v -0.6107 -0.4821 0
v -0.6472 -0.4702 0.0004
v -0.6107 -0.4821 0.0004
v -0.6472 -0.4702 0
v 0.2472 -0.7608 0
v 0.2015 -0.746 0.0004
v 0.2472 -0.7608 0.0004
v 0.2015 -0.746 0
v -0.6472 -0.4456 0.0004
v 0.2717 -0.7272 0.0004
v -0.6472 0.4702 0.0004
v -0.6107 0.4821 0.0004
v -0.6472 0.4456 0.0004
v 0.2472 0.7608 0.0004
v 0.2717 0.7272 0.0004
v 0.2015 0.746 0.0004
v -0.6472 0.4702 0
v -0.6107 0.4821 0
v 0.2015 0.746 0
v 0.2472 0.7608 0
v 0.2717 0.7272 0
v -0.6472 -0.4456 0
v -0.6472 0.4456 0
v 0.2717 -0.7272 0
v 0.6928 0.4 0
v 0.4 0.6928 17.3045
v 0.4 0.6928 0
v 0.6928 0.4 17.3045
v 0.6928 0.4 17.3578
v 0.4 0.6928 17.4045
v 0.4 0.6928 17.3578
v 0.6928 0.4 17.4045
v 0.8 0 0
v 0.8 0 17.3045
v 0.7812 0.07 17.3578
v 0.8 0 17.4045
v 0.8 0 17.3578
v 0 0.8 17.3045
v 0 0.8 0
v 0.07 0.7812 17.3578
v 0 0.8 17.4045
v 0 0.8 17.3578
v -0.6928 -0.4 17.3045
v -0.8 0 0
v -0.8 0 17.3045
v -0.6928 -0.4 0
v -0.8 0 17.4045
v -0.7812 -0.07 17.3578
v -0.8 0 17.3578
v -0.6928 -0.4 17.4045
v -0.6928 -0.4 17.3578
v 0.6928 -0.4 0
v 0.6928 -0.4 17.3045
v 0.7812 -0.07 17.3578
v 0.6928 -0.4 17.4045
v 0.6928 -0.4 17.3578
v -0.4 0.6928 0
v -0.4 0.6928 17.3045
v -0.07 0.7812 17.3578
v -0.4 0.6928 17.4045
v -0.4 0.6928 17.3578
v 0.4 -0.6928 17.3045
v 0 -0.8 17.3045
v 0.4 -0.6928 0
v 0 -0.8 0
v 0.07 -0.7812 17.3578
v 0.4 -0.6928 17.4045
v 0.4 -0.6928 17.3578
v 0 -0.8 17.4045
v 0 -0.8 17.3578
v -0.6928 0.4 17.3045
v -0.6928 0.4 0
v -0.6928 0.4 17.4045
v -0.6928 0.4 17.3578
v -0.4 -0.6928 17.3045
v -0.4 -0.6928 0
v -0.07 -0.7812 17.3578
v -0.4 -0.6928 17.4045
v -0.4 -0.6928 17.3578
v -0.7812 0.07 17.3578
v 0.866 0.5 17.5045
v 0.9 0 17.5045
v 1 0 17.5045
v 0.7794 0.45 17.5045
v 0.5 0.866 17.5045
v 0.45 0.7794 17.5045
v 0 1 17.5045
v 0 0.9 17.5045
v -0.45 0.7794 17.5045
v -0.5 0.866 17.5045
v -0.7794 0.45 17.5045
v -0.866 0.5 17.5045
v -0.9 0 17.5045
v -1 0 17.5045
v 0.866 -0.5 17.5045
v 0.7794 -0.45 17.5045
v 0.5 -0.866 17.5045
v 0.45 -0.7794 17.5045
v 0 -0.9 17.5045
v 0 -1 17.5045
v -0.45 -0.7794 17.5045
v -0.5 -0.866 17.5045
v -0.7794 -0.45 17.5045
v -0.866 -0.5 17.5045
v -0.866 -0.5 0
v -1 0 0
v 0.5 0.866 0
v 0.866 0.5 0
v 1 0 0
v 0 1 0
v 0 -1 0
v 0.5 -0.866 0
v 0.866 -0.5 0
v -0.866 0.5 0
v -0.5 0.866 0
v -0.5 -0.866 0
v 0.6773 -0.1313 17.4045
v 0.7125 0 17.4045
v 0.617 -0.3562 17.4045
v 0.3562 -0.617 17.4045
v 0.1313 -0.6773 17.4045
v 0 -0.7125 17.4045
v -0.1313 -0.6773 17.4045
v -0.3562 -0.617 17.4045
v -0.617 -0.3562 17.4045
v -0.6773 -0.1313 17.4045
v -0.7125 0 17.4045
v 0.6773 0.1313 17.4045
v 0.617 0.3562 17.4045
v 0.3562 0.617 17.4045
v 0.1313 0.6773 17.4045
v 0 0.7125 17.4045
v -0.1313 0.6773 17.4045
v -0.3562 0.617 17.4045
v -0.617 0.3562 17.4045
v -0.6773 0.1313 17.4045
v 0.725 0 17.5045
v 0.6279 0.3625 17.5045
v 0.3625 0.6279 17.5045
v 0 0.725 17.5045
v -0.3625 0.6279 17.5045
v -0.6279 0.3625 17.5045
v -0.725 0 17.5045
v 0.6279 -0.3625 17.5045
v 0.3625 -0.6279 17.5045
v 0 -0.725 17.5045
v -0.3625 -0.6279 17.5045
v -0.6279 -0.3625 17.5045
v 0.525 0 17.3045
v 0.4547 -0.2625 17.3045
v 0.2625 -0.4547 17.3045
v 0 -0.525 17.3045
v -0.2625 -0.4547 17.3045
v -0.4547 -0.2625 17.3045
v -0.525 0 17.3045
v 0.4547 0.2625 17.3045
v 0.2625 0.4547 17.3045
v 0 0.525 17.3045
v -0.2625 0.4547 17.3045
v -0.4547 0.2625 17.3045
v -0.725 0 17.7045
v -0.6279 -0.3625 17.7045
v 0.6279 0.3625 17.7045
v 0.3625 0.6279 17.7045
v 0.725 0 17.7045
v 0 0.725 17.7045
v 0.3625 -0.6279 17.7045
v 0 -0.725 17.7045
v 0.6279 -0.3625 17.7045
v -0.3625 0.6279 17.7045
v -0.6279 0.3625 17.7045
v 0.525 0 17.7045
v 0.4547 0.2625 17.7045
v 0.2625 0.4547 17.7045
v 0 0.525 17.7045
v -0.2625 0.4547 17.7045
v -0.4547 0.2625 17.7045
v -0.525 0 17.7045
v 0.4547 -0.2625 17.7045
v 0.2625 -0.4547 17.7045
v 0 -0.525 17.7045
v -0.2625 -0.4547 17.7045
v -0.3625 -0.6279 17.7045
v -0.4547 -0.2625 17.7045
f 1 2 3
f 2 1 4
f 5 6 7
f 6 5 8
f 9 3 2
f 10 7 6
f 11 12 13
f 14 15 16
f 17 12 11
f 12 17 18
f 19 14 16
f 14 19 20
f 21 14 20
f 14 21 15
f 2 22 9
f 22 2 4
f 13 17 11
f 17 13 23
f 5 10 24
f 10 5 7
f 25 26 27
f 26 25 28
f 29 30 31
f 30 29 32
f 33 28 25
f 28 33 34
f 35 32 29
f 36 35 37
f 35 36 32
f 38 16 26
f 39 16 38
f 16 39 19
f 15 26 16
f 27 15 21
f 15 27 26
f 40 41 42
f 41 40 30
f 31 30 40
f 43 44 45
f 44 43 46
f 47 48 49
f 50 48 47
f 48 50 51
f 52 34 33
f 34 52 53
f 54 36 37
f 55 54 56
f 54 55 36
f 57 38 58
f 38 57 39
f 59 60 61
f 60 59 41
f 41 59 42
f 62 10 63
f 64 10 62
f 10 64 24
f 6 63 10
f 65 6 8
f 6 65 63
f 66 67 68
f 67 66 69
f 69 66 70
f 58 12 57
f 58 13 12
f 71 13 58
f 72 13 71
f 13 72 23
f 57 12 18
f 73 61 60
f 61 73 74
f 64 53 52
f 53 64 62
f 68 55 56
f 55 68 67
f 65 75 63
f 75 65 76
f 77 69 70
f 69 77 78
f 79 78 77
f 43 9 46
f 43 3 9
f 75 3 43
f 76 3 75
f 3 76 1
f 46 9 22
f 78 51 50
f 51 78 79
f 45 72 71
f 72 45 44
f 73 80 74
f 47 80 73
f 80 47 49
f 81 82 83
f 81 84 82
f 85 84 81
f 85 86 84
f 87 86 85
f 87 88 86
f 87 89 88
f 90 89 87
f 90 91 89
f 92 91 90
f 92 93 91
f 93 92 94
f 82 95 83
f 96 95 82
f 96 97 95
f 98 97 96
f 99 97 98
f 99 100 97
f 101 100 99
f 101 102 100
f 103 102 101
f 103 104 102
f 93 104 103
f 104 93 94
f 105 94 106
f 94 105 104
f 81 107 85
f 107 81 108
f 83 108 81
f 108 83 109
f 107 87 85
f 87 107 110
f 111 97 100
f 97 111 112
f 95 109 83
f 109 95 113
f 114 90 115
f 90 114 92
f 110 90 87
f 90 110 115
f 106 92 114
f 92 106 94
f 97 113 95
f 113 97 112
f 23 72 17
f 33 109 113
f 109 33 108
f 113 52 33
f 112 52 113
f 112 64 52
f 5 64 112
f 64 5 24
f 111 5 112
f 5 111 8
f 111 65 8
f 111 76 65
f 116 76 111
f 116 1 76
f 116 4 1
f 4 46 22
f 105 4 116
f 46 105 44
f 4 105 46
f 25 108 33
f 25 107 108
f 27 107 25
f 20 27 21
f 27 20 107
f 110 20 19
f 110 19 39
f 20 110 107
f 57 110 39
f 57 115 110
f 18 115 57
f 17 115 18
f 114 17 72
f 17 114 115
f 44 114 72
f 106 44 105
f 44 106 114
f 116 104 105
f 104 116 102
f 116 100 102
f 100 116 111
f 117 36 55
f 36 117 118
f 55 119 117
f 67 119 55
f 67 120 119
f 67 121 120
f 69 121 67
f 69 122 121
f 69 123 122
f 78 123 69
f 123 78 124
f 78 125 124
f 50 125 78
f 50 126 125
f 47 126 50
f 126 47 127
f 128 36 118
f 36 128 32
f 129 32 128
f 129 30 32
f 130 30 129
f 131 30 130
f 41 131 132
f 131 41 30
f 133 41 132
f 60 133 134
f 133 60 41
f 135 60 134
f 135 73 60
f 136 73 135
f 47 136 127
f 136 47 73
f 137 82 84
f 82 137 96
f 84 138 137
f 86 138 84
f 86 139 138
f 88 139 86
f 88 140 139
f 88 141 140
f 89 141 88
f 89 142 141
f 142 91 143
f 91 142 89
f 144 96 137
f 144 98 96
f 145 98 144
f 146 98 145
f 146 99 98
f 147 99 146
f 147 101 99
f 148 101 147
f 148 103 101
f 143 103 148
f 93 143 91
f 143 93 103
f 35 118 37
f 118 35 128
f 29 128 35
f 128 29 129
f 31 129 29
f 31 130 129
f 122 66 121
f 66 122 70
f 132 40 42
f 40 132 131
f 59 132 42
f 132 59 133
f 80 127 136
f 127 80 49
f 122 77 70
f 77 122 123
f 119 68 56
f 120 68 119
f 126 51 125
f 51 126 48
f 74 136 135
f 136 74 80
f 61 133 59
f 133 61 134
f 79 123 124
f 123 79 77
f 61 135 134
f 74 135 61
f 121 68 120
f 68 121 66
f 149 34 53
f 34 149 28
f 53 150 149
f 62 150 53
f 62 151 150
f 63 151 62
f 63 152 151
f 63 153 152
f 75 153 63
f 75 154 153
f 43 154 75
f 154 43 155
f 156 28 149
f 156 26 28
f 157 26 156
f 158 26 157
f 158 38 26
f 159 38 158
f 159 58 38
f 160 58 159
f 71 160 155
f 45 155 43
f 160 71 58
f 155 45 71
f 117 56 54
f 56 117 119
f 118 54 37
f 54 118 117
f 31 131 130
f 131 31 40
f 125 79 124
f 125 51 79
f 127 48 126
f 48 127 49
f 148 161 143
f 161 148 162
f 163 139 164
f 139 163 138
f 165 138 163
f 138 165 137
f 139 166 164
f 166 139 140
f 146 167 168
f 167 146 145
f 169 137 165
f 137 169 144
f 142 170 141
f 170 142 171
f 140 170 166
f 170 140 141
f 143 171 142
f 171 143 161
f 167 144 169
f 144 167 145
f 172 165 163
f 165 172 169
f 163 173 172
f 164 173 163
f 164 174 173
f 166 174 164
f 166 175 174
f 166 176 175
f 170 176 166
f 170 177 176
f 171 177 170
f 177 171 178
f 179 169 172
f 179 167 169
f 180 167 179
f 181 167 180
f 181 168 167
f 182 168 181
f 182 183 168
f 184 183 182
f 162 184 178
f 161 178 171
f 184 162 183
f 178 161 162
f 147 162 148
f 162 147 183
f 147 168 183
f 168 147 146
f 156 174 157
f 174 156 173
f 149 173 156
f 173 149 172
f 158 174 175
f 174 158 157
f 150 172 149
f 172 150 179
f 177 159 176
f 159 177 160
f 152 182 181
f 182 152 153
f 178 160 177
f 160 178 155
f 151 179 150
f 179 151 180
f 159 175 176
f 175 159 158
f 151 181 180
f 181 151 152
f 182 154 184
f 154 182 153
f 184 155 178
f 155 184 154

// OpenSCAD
tolerance=0.075;
hole_radius=0.05;
grid_hole_radius=0.05;
outer_radius=1;
thickness=0.2;
hole_attach_height=0.05;
attach_thickness=0.1;

//parameters that don't have to be defined explicitly
eps = tolerance/100;
inner_radius = outer_radius - thickness;
fn = 12;
fnh = 6;

module angled_cylinder(angle_deg_y, _h, _r, angle_deg_x = 0) {
    rotate([angle_deg_x, angle_deg_y, 0]) { // Rotate the cylinder 
            cylinder(h = _h, r = _r, center = true, $fn = fnh);
        }
}

module hole(_h) {
    cylinder(h = _h, r = grid_hole_radius, $fn = fnh);
}

//makes circle of holes
module circular_grid(_h, _r, _n) {
    for (i = [0:_n-1]) {
        angle = i * 360 / _n;
        x_pos = _r * cos(angle);
        y_pos = _r * sin(angle);
        translate([x_pos, y_pos, -eps]) {
            hole(_h);
        }
    }
}

//makes grid of holes
module hole_grid(hole_height, grid_h) {
    translate([0,0,hole_height]) {
        difference() {
            //cylinder
            cylinder(h = grid_h, r = (inner_radius + outer_radius)/2, 
                center=false, $fn = fn);
            //holes
            for (i = [0 : grid_hole_radius * 2 + hole_attach_height : inner_radius - grid_hole_radius * 2]) {
                circular_grid(grid_h + eps*2, i, ceil(6.28*i/(grid_hole_radius*4)));
            }
            
        } 
    }
}

//makes curve of CSC
module curve(_radius, _twist, _turning_angle, _turning_radius) {
    rotate([90,0,_twist])
    translate([-_turning_radius, 0, 0])
    rotate_extrude(angle=_turning_angle, convexity=100, $fn = fn)
    translate([_turning_radius, 0]) circle(_radius);
}

module CSC(_r, _t1, _ta1, _tr1, _h, _t2, _ta2, _tr2, is_inner) {
    
    if (_ta1 > 90) {
        CSC(_r, _t1, 90, _tr1, 0, 0, 0, 0, is_inner);
        
        pos1 = (-_tr1 + sqrt(_tr1*_tr1 - pow(_tr1,2)));
        translate([pos1*cos(_t1),pos1*sin(_t1),_tr1])
        rotate([0,-90,_t1])
        CSC(_r, 0, _ta1 - 90, _tr1, _h, _t2, _ta2, _tr2, is_inner);
    } else if (_ta2 > 90) {
        CSC(_r, _t1, _ta1, _tr1, _h, _t2, 90, _tr2, is_inner);
        
        pos1 = (-_tr1 + sqrt(_tr1*_tr1 - pow(_tr1*sin(_ta1),2)));
        pos2 = (-_tr2 + sqrt(_tr2*_tr2 - pow(_tr2,2)));
        translate([pos1*cos(_t1),pos1*sin(_t1),_tr1*sin(_ta1)])
        rotate([0,-_ta1,_t1])
        translate([0, 0, _h])
        translate([pos2*cos(_t2),pos2*sin(_t2),_tr2])
        rotate([0,-90,_t2])
        CSC(_r, 0, 0, 0, 0, 0, _ta2 - 90, _tr2, is_inner);
    } else {
        //intermediate positions
        pos1 = (-_tr1 + sqrt(_tr1*_tr1 - pow(_tr1*sin(_ta1),2)));
        pos2 = (-_tr2 + sqrt(_tr2*_tr2 - pow(_tr2*sin(_ta2),2)));
        
        union() {
            //bottom shell threshold
            if (is_inner) {
                cylinder(h=eps, r=_r, center=true);
            }
            
            //first curve of CSC
            curve(_r, _t1, _ta1, _tr1);
            
            //straight link of CSC
            translate([pos1*cos(_t1),pos1*sin(_t1),_tr1*sin(_ta1)])
            rotate([0,-_ta1,_t1])
            if (is_inner) {
                //add threshold for shelling
                translate([0,0,-eps /2])
                cylinder(h=_h + eps,r=_r, center = false, $fn= fn);
            } else {
                cylinder(h=_h,r=_r, center = false, $fn= fn);
            }
            
            //second curve of CSC
            translate([pos1*cos(_t1),pos1*sin(_t1),_tr1*sin(_ta1)])
            rotate([0,-_ta1,_t1])
            translate([0, 0, _h])
            curve(_r, _t2, _ta2, _tr2);
            
            //shelling thresholds
            if (is_inner) {
                translate([pos1*cos(_t1),pos1*sin(_t1),_tr1*sin(_ta1)])
                rotate([0,-_ta1,_t1])
                translate([0, 0, _h])
                translate([pos2*cos(_t2),pos2*sin(_t2),_tr2*sin(_ta2)])
                rotate([0,-_ta2,_t2]) {
                    cylinder(h=eps, r=_r, center=true,$fn=fn);
                }
            
            }
        }
    }
    
}

//allow modules to attach
module CSC_ATTACH(_r, _t1, _ta1, _tr1, _h, _t2, _ta2, _tr2, next_hole_radius, next_hole_attach_height, next_inner) {
    
    if (_ta1 > 90) {        
        pos1 = (-_tr1 + sqrt(_tr1*_tr1 - pow(_tr1,2)));
        translate([pos1*cos(_t1),pos1*sin(_t1),_tr1])
        rotate([0,-90,_t1])
        CSC_ATTACH(_r, 0, _ta1 - 90, _tr1, _h, _t2, _ta2, _tr2, next_hole_radius, next_hole_attach_height, next_inner);
    } else if (_ta2 > 90) {        
        pos1 = (-_tr1 + sqrt(_tr1*_tr1 - pow(_tr1*sin(_ta1),2)));
        pos2 = (-_tr2 + sqrt(_tr2*_tr2 - pow(_tr2,2)));
        translate([pos1*cos(_t1),pos1*sin(_t1),_tr1*sin(_ta1)])
        rotate([0,-_ta1,_t1])
        translate([0, 0, _h])
        translate([pos2*cos(_t2),pos2*sin(_t2),_tr2])
        rotate([0,-90,_t2])
        CSC_ATTACH(_r, 0, 0, 0, 0, 0, _ta2 - 90, _tr2, next_hole_radius, next_hole_attach_height, next_inner);
    } else {
        //intermediate positions
        pos1 = (-_tr1 + sqrt(_tr1*_tr1 - pow(_tr1*sin(_ta1),2)));
        pos2 = (-_tr2 + sqrt(_tr2*_tr2 - pow(_tr2*sin(_ta2),2)));
        
        translate([pos1*cos(_t1),pos1*sin(_t1),_tr1*sin(_ta1)])
        rotate([0,-_ta1,_t1])
        translate([0, 0, _h])
        translate([pos2*cos(_t2),pos2*sin(_t2),_tr2*sin(_ta2)])
        rotate([0,-_ta2,_t2]) {
            difference() {
                union() {
                    //attachment for smaller cylinder
                    translate([0,0,-attach_thickness])
                    cylinder(h=attach_thickness, r=_r - thickness/2, $fn=fn);
                    translate([0,0,-attach_thickness*2])
                    cylinder(h=attach_thickness*2, r1=_r - thickness/2, r2=next_inner - tolerance - thickness, $fn=fn);
                    
                    //small cylinder
                    cylinder(h=next_hole_radius*2 + next_hole_attach_height * 2, r = next_inner - tolerance, $fn=fn);
                }
                
                //shelling
                translate([0,0, -attach_thickness*2 - eps/2])
                cylinder(h=next_hole_radius*2 + next_hole_attach_height * 2 + attach_thickness*2 + eps, r = min(inner_radius, next_inner - tolerance - thickness), $fn=fn);
                
                //holes for screws
    //            translate([0,0,next_hole_attach_height + next_hole_radius]) {
    //                angled_cylinder(0, (next_inner + thickness + eps) * 2,  hole_radius, 90);
    //                angled_cylinder(90, (next_inner + thickness + eps) * 2, hole_radius, 0);
    //            }
            }
        }
    }
}

//remove overlap to allow all branches to attach to each other
module CSC_REMOVE_OVERLAP(_r, _t1, _ta1, _tr1, _h, _t2, _ta2, _tr2, next_hole_radius, next_hole_attach_height, next_inner) {
    if (_ta1 > 90) {        
        pos1 = (-_tr1 + sqrt(_tr1*_tr1 - pow(_tr1,2)));
        translate([pos1*cos(_t1),pos1*sin(_t1),_tr1])
        rotate([0,-90,_t1])
        CSC_REMOVE_OVERLAP(_r, 0, _ta1 - 90, _tr1, _h, _t2, _ta2, _tr2, next_hole_radius, next_hole_attach_height, next_inner);
    } else if (_ta2 > 90) {        
        pos1 = (-_tr1 + sqrt(_tr1*_tr1 - pow(_tr1*sin(_ta1),2)));
        pos2 = (-_tr2 + sqrt(_tr2*_tr2 - pow(_tr2,2)));
        translate([pos1*cos(_t1),pos1*sin(_t1),_tr1*sin(_ta1)])
        rotate([0,-_ta1,_t1])
        translate([0, 0, _h])
        translate([pos2*cos(_t2),pos2*sin(_t2),_tr2])
        rotate([0,-90,_t2])
        CSC_REMOVE_OVERLAP(_r, 0, 0, 0, 0, 0, _ta2 - 90, _tr2, next_hole_radius, next_hole_attach_height, next_inner);
    } else {
        pos1 = (-_tr1 + sqrt(_tr1*_tr1 - pow(_tr1*sin(_ta1),2)));
        pos2 = (-_tr2 + sqrt(_tr2*_tr2 - pow(_tr2*sin(_ta2),2)));
        
        translate([pos1*cos(_t1),pos1*sin(_t1),_tr1*sin(_ta1)])
        rotate([0,-_ta1,_t1])
        translate([0, 0, _h])
        translate([pos2*cos(_t2),pos2*sin(_t2),_tr2*sin(_ta2)])
        rotate([0,-_ta2,_t2]) {
            cylinder(h=999999, r=_r + tolerance, $fn=fn);
        }
    }
}

//c is _t1, _ta1, _tr1, _h, _t2, _ta2, _tr2, next hole radius, next hole height, next inner radius
module branch(branch_list, _outer, _inner) {
    union() {
        //make grid of holes
        //hole_grid(hole_radius*2 + hole_attach_height * 2, grid_hole_radius);
        
        //make CSC shells for each CSC in branch_list
        difference() {
            for (c = branch_list) {
                CSC(_outer,c[0],c[1],c[2],c[3],c[4],c[5],c[6], false);
            }
            
            for (c = branch_list) {
                CSC(_inner,c[0],c[1],c[2],c[3],c[4],c[5],c[6], true);
                CSC_REMOVE_OVERLAP(_outer,c[0],c[1],c[2],c[3],c[4],c[5],c[6],c[7], c[8], c[9]);
            }
            
            //make screw holes at the bottom
//            translate([0,0,hole_radius + hole_attach_height]) {
//                angled_cylinder(0, (outer_radius*1.5 + eps) * 2,  hole_radius, 90);
//                angled_cylinder(90, (outer_radius*1.5 + eps) * 2, hole_radius, 0);
//            }    
        }
        for (c=branch_list) {     
            CSC_ATTACH(_outer,c[0],c[1],c[2],c[3],c[4],c[5],c[6], c[7], c[8], c[9]);
        }
    }
}

branch([
[ 0.0, 0.0, 1.0*outer_radius, 17.5045*outer_radius, 0.0, 0.0, 1.0*outer_radius, 0.05, 0.05, 0.8],
],outer_radius,inner_radius);
